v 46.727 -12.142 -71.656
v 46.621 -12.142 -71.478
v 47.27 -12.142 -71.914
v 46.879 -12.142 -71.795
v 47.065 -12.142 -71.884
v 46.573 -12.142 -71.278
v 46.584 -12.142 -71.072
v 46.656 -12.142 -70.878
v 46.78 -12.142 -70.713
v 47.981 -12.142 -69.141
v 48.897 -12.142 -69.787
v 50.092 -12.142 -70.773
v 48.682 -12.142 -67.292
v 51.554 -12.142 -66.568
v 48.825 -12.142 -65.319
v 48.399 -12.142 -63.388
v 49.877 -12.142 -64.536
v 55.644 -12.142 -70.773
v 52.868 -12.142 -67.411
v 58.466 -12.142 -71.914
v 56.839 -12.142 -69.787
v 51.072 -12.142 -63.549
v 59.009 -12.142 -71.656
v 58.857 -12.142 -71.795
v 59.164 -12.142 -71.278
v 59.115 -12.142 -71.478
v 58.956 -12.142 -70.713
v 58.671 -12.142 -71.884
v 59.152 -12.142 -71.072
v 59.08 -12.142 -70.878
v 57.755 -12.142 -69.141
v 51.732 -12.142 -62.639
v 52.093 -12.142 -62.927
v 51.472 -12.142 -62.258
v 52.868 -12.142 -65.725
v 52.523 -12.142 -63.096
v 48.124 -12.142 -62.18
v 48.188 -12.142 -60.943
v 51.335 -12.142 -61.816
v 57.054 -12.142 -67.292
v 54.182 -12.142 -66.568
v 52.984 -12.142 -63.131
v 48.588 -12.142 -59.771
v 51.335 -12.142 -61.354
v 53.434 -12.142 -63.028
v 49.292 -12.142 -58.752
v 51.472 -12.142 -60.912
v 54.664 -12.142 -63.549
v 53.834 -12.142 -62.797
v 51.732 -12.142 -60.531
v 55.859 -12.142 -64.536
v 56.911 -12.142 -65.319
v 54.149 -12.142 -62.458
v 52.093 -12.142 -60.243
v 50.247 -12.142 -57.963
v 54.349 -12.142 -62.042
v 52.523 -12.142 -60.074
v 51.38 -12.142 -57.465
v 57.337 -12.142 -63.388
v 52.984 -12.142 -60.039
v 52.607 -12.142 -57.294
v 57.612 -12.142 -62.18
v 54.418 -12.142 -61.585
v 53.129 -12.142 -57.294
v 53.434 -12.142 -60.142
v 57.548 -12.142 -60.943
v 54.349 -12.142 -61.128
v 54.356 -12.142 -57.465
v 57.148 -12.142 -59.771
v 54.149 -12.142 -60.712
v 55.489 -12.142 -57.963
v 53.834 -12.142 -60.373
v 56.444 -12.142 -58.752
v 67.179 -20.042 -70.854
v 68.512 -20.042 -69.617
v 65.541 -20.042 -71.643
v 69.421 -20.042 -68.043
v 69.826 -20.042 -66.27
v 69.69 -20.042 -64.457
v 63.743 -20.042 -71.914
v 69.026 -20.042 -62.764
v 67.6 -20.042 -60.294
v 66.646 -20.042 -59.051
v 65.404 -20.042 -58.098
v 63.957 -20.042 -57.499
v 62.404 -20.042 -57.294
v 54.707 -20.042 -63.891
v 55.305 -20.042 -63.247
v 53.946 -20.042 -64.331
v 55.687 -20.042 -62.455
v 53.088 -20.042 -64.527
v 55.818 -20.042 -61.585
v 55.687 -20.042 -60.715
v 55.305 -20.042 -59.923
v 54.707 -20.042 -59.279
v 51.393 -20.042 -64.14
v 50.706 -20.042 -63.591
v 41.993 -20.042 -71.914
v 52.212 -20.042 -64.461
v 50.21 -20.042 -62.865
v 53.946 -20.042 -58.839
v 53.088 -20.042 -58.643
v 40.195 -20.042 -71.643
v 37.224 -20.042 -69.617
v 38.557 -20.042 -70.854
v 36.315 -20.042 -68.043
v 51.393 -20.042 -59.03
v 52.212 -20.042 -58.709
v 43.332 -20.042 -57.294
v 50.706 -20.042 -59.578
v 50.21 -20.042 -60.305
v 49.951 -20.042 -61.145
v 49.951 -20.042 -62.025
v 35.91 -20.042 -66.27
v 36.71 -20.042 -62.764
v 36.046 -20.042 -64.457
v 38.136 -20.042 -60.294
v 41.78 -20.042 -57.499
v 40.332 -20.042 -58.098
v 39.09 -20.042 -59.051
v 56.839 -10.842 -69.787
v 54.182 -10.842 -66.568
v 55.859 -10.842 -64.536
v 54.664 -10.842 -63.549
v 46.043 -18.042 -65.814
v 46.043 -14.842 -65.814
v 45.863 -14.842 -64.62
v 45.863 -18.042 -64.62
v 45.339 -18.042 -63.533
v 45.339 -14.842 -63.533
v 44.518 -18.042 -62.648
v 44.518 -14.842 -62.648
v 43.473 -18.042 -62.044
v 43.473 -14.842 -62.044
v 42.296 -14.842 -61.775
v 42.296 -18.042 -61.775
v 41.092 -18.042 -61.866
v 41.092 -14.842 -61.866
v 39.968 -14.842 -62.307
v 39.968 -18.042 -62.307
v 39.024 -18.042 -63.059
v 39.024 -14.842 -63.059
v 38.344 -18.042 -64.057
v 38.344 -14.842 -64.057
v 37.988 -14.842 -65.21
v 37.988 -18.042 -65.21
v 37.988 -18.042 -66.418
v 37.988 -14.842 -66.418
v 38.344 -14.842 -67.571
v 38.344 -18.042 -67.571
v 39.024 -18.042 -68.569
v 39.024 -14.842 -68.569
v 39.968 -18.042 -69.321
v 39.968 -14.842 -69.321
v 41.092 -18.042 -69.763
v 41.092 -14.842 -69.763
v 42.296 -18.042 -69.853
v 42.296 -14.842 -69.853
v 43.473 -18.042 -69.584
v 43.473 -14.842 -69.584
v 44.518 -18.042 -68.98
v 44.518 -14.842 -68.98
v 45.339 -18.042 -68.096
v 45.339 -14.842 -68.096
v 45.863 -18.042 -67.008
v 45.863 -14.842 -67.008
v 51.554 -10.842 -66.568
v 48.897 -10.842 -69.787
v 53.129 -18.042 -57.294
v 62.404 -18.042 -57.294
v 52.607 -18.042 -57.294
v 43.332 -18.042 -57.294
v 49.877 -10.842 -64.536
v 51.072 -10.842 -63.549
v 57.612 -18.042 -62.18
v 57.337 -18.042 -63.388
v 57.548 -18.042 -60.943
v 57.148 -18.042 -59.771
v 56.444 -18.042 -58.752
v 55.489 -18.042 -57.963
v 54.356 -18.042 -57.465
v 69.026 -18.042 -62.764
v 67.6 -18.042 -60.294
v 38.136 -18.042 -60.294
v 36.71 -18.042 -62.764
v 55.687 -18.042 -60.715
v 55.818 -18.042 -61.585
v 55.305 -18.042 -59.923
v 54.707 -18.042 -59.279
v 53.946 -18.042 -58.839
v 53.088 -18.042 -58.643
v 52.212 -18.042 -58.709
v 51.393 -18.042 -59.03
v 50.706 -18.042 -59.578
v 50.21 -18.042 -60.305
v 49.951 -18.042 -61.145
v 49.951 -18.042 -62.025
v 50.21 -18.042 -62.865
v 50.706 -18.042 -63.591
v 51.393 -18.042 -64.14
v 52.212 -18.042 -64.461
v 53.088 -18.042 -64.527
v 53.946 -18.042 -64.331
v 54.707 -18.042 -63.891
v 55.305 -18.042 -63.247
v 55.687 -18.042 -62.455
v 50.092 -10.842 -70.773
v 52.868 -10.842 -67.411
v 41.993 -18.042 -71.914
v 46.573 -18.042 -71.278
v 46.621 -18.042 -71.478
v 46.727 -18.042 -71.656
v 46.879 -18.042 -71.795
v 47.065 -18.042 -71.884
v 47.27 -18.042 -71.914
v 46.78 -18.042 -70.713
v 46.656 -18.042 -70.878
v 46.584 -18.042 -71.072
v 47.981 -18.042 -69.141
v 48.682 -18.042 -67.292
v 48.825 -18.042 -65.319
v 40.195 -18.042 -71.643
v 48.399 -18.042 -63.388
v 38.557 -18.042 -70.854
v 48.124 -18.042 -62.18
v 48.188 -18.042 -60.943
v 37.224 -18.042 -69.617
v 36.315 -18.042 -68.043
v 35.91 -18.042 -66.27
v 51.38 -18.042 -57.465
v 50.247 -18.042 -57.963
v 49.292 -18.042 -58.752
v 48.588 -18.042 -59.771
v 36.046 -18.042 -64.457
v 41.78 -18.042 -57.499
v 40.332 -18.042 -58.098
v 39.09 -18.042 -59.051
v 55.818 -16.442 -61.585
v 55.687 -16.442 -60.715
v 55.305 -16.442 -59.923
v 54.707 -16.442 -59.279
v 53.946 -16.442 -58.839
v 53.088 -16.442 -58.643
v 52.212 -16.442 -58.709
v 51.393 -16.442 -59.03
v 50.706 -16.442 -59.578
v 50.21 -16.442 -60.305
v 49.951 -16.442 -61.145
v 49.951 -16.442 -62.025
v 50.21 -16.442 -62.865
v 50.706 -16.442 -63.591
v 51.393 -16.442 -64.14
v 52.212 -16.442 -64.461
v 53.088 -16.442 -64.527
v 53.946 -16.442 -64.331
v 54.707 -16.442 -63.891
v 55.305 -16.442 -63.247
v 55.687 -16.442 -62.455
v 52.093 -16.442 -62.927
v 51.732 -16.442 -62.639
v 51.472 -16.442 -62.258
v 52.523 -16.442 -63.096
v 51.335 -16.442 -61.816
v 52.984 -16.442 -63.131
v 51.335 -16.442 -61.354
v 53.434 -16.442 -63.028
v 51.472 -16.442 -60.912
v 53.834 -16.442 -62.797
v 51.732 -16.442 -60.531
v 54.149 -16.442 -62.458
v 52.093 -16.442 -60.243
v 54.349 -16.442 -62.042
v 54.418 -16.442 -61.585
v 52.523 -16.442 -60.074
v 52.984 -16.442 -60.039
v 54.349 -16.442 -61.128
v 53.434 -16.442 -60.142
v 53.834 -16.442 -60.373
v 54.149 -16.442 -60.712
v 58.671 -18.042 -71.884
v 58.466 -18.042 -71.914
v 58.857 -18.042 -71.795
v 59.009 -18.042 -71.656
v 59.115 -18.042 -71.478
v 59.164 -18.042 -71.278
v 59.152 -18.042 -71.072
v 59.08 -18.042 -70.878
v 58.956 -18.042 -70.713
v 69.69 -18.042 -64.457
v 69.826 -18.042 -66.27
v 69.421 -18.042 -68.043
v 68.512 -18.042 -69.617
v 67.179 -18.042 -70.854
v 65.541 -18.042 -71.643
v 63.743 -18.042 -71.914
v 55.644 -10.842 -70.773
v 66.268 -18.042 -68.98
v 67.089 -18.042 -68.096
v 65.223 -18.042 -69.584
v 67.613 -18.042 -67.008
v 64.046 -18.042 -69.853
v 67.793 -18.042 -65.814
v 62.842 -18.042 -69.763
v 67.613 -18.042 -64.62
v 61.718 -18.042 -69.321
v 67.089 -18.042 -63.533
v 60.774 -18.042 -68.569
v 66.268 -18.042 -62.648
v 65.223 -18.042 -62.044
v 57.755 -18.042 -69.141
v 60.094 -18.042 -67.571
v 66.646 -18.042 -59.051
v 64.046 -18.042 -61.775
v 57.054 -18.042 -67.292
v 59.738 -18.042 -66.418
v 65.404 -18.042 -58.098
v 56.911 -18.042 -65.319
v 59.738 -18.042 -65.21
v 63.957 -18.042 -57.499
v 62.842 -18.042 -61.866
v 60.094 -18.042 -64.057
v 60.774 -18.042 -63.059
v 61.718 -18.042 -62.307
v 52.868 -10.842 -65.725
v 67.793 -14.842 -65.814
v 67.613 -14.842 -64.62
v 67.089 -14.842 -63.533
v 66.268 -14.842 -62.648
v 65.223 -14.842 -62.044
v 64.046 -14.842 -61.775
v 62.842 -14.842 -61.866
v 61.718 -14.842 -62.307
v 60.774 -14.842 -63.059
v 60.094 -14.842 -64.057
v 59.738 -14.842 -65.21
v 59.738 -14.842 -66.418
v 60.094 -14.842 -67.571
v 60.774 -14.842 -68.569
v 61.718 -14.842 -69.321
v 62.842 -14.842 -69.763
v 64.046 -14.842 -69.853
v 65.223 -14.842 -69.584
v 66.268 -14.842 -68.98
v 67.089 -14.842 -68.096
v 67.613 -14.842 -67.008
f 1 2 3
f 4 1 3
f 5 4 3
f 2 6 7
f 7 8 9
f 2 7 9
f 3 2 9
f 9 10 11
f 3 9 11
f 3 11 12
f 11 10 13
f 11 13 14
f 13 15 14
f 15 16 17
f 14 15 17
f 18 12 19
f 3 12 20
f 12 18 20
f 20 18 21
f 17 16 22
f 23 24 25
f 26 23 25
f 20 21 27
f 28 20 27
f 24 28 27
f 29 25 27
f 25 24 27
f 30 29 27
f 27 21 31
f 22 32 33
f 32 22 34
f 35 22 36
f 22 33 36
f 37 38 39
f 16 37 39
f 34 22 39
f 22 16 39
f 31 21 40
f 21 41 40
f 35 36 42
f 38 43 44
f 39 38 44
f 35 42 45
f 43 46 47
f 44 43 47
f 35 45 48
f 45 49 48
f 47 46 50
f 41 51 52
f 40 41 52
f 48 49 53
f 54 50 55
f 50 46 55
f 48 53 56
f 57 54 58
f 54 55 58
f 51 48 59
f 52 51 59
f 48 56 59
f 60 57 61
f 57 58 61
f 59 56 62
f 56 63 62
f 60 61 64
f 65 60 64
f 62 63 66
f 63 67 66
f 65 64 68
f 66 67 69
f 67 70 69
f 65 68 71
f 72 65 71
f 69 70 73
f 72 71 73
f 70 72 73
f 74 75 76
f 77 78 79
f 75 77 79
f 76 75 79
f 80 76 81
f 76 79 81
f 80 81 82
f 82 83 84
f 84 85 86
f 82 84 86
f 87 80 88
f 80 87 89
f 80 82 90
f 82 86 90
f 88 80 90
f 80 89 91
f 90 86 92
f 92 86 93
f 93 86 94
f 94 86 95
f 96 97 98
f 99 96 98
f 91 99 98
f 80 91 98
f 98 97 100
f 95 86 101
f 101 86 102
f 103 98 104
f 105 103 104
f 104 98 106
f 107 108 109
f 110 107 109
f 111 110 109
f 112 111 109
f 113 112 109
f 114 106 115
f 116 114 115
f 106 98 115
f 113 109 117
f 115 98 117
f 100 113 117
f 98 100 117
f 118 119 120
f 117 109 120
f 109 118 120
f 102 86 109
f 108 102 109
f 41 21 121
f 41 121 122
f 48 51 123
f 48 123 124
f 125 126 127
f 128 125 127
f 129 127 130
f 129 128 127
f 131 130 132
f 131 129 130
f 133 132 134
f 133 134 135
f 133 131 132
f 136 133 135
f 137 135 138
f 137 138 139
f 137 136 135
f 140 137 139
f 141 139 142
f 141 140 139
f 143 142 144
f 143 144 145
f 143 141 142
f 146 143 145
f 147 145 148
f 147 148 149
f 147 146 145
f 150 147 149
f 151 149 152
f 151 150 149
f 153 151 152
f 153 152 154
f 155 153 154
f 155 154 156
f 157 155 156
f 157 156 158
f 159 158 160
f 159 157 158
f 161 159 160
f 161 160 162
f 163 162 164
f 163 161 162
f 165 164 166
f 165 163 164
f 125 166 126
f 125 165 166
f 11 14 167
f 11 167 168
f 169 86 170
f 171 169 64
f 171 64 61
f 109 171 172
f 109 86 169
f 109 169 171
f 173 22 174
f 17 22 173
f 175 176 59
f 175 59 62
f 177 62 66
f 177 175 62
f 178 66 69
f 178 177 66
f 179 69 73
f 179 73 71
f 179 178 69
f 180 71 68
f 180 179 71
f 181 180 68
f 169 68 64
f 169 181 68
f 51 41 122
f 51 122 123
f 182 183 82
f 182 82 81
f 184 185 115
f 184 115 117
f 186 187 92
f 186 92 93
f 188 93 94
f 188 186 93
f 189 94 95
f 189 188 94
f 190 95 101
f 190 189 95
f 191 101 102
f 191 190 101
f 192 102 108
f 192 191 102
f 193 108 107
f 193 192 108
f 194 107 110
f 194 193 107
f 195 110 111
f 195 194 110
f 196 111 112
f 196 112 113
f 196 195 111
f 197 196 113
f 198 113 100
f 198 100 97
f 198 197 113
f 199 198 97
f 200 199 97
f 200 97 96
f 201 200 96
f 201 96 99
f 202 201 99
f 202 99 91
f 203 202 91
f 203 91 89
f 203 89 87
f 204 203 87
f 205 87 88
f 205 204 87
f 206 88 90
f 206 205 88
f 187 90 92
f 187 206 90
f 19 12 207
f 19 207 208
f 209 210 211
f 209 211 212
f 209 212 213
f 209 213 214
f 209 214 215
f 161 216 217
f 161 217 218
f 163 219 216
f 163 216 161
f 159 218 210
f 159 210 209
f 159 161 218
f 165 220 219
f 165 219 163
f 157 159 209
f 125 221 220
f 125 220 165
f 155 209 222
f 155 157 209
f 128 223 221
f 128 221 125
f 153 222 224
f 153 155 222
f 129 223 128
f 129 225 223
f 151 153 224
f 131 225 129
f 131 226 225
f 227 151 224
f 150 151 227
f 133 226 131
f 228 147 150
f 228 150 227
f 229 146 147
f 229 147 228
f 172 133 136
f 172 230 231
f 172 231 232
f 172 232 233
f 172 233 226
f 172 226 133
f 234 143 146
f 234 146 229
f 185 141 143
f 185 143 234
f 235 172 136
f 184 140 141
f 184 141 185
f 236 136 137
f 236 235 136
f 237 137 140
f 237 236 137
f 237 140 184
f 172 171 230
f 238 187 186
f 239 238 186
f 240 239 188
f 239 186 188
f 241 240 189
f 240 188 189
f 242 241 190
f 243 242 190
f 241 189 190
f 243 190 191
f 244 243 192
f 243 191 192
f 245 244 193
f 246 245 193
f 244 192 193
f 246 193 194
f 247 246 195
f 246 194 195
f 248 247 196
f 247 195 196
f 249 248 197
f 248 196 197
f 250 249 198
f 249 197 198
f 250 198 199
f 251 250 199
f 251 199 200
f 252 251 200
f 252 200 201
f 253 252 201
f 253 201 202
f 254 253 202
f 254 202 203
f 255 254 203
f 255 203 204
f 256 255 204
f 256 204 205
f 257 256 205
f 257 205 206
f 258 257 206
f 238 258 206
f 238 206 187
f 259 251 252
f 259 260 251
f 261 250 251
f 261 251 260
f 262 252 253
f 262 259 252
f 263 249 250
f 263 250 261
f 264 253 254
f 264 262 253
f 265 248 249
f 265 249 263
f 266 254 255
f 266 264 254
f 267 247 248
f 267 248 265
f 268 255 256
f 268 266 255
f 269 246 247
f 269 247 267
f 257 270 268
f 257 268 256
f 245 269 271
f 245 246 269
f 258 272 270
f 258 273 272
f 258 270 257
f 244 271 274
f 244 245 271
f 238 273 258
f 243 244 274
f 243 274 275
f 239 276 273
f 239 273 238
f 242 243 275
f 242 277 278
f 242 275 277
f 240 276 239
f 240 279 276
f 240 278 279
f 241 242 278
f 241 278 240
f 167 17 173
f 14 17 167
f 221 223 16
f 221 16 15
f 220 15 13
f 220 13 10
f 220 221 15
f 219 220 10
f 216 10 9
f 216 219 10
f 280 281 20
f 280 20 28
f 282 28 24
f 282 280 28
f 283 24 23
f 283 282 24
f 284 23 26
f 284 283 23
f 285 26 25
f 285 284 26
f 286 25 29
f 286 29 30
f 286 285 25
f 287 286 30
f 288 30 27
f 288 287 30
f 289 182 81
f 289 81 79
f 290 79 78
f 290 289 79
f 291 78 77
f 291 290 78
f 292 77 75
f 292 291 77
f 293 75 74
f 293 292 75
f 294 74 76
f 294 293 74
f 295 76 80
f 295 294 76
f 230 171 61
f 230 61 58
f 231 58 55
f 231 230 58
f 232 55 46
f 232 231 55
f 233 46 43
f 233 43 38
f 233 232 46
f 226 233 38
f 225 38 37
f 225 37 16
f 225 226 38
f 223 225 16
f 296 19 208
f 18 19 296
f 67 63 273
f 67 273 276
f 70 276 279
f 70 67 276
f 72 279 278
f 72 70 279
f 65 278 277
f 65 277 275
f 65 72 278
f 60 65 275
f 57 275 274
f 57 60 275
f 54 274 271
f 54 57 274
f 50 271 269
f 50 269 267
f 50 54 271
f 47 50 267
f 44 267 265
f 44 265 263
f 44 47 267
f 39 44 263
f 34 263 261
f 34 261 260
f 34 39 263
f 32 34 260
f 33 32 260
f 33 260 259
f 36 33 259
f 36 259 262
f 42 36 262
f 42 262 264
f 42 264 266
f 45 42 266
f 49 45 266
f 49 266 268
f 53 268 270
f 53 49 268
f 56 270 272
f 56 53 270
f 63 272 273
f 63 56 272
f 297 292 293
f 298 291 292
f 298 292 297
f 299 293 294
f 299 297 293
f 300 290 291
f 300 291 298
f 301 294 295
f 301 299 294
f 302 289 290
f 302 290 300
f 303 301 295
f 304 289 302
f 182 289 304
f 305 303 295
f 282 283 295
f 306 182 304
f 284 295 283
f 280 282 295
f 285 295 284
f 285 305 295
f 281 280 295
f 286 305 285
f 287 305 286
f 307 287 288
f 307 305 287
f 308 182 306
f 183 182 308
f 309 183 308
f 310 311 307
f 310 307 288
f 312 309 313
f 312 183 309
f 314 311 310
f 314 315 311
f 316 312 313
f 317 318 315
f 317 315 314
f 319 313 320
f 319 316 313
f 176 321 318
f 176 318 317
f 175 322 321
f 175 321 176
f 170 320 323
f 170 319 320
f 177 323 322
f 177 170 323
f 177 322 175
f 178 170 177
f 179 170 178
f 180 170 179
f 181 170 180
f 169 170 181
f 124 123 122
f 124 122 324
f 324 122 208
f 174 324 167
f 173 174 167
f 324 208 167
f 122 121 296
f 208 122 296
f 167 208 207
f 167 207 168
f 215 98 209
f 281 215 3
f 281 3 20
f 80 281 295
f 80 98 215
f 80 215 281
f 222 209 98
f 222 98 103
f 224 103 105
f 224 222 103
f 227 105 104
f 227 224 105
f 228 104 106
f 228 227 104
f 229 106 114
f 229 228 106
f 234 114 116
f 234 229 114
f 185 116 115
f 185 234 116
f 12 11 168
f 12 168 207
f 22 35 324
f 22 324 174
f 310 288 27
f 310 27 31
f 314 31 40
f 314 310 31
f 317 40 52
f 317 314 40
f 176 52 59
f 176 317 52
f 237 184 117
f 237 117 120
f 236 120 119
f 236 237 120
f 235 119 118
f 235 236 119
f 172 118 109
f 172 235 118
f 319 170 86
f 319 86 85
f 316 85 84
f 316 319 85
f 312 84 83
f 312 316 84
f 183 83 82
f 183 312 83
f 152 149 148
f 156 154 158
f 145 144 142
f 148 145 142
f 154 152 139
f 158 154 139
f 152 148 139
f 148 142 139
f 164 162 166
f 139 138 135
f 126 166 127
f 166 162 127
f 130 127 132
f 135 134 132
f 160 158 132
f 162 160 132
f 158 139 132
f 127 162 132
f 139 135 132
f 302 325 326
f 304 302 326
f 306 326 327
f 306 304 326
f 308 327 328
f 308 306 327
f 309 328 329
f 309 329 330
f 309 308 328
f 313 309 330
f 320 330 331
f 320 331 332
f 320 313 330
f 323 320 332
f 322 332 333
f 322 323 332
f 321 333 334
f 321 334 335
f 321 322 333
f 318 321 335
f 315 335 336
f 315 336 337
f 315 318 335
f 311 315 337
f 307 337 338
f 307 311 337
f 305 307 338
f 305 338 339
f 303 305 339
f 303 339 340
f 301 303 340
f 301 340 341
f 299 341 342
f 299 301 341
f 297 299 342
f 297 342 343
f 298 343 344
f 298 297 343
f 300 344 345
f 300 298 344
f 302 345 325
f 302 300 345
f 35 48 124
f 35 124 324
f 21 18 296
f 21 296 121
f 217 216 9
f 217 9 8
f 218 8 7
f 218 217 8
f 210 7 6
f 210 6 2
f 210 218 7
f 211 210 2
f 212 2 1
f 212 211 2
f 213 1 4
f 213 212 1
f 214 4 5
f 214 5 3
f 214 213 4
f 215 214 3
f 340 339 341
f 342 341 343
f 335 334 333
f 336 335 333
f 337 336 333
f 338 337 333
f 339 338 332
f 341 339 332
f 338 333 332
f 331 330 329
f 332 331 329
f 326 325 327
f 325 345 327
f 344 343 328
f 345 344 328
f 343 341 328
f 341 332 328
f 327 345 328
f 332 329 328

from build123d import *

# Parameters (mm, degrees)
BOSS_EXTRUDE1_START        = 0.2
SKETCH2_R                  = 4.05
BOSS_EXTRUDE1_DEPTH        = 0.2
BOSS_EXTRUDE1_DEPTH_BACK   = 3
BOSS_EXTRUDE1_2_DEPTH      = 0.2
BOSS_EXTRUDE1_2_DEPTH_BACK = 3
BOSS_EXTRUDE2_START        = 0.4
SKETCH2_8_R                = 2.95
BOSS_EXTRUDE2_DEPTH        = 2
BOSS_EXTRUDE3_START        = 0.4
SKETCH2_10_R               = 2.95
BOSS_EXTRUDE3_DEPTH        = 5.9
BOSS_EXTRUDE4_START        = -5.5
SKETCH2_11_R               = 2.95
SKETCH2_11_R_2             = 1.55
BOSS_EXTRUDE4_DEPTH        = 4.3
BOSS_EXTRUDE5_DEPTH        = 1.3


with BuildPart() as part:
    # Sketch2 → Boss-Extrude1 (new body, two sides)
    with BuildSketch(Plane.XZ.offset(17.641705272).offset(BOSS_EXTRUDE1_START)) as boss_extrude1_sk:
        with Locations((41.993031242, -65.814080244)):
            Circle(SKETCH2_R)
    extrude(amount=BOSS_EXTRUDE1_DEPTH)
    extrude(boss_extrude1_sk.sketch, amount=-BOSS_EXTRUDE1_DEPTH_BACK)



with BuildPart() as body_2:
    # Sketch2 → Boss-Extrude1 2 (new body, two sides)
    with BuildSketch(Plane.XZ.offset(17.641705272).offset(BOSS_EXTRUDE1_START)) as boss_extrude1_2_sk:
        with Locations((63.743031242, -65.814080244)):
            Circle(SKETCH2_R)
    extrude(amount=BOSS_EXTRUDE1_2_DEPTH)
    extrude(boss_extrude1_2_sk.sketch, amount=-BOSS_EXTRUDE1_2_DEPTH_BACK)


with BuildPart() as part_1:
    add(part.part)

    add(body_2.part)  # Boss-Extrude2 merges body 2
    # Sketch2_8 → Boss-Extrude2 (add)
    with BuildSketch(Plane.XZ.offset(17.641705272).offset(BOSS_EXTRUDE2_START)):
        with BuildLine():
            Line((43.332476509, -57.294092988), (62.403585975, -57.294092988))
            ThreePointArc((62.403585975, -57.294092988), (65.403585975, -58.097940565), (67.599738397, -60.294092988))
            Line((67.599738397, -60.294092988), (69.025786205, -62.764080244))
            ThreePointArc((69.025786205, -62.764080244), (69.025786205, -68.864080244), (63.743031242, -71.914080244))
            Line((63.743031242, -71.914080244), (41.993031242, -71.914080244))
            ThreePointArc((41.993031242, -71.914080244), (36.710276279, -68.864080244), (36.710276279, -62.764080244))
            Line((36.710276279, -62.764080244), (38.136324086, -60.294092988))
            ThreePointArc((38.136324086, -60.294092988), (40.332476509, -58.097940565), (43.332476509, -57.294092988))
        make_face()
        with Locations((52.868031242, -61.584989522)):
            Circle(SKETCH2_8_R, mode=Mode.SUBTRACT)
    extrude(amount=BOSS_EXTRUDE2_DEPTH)

    # Sketch2_10 → Boss-Extrude3 (add)
    with BuildSketch(Plane.XZ.offset(17.641705272).offset(BOSS_EXTRUDE3_START)):
        with BuildLine():
            Line((53.128785981, -57.294092988), (52.607276503, -57.294092988))
            ThreePointArc((52.607276503, -57.294092988), (48.904424631, -59.236968036), (48.39898543, -63.387920534))
            ThreePointArc((48.39898543, -63.387920534), (48.681708279, -67.291950162), (46.7804094, -70.713417992))
            ThreePointArc((46.7804094, -70.713417992), (46.621377652, -71.478216974), (47.269630525, -71.914080244))
            Line((47.269630525, -71.914080244), (58.466431958, -71.914080244))
            ThreePointArc((58.466431958, -71.914080244), (59.114684832, -71.478216974), (58.955653084, -70.713417992))
            ThreePointArc((58.955653084, -70.713417992), (57.054354205, -67.291950162), (57.337077053, -63.387920534))
            ThreePointArc((57.337077053, -63.387920534), (56.831637852, -59.236968036), (53.128785981, -57.294092988))
        make_face()
        with Locations((52.868031242, -61.584989522)):
            Circle(SKETCH2_10_R, mode=Mode.SUBTRACT)
    extrude(amount=-BOSS_EXTRUDE3_DEPTH)

    # Sketch2_11 → Boss-Extrude4 (add)
    with BuildSketch(Plane.XZ.offset(17.641705272).offset(BOSS_EXTRUDE4_START)):
        with Locations((52.868031242, -61.584989522)):
            Circle(SKETCH2_11_R)
        with Locations((52.868031242, -61.584989522)):
            Circle(SKETCH2_11_R_2, mode=Mode.SUBTRACT)
    extrude(amount=BOSS_EXTRUDE4_DEPTH)

    # Sketch3 → Boss-Extrude5 (add)
    with BuildSketch(Plane(origin=(0, -12.141705272, 0), x_dir=(1, 0, 0), z_dir=(0, 1, 0))):
        Polygon((50.091896525, 70.773300161), (52.868031242, 67.410555891), (55.644165958, 70.773300161), (56.83946806, 69.786510981), (54.182101398, 66.567630982), (55.859200009, 64.536154012), (54.663897908, 63.549364832), (52.868031242, 65.724706073), (51.072164576, 63.549364832), (49.876862474, 64.536154012), (51.553961085, 66.567630982), (48.896594423, 69.786510981), align=None)
    extrude(amount=BOSS_EXTRUDE5_DEPTH)


solid = part_1.part
